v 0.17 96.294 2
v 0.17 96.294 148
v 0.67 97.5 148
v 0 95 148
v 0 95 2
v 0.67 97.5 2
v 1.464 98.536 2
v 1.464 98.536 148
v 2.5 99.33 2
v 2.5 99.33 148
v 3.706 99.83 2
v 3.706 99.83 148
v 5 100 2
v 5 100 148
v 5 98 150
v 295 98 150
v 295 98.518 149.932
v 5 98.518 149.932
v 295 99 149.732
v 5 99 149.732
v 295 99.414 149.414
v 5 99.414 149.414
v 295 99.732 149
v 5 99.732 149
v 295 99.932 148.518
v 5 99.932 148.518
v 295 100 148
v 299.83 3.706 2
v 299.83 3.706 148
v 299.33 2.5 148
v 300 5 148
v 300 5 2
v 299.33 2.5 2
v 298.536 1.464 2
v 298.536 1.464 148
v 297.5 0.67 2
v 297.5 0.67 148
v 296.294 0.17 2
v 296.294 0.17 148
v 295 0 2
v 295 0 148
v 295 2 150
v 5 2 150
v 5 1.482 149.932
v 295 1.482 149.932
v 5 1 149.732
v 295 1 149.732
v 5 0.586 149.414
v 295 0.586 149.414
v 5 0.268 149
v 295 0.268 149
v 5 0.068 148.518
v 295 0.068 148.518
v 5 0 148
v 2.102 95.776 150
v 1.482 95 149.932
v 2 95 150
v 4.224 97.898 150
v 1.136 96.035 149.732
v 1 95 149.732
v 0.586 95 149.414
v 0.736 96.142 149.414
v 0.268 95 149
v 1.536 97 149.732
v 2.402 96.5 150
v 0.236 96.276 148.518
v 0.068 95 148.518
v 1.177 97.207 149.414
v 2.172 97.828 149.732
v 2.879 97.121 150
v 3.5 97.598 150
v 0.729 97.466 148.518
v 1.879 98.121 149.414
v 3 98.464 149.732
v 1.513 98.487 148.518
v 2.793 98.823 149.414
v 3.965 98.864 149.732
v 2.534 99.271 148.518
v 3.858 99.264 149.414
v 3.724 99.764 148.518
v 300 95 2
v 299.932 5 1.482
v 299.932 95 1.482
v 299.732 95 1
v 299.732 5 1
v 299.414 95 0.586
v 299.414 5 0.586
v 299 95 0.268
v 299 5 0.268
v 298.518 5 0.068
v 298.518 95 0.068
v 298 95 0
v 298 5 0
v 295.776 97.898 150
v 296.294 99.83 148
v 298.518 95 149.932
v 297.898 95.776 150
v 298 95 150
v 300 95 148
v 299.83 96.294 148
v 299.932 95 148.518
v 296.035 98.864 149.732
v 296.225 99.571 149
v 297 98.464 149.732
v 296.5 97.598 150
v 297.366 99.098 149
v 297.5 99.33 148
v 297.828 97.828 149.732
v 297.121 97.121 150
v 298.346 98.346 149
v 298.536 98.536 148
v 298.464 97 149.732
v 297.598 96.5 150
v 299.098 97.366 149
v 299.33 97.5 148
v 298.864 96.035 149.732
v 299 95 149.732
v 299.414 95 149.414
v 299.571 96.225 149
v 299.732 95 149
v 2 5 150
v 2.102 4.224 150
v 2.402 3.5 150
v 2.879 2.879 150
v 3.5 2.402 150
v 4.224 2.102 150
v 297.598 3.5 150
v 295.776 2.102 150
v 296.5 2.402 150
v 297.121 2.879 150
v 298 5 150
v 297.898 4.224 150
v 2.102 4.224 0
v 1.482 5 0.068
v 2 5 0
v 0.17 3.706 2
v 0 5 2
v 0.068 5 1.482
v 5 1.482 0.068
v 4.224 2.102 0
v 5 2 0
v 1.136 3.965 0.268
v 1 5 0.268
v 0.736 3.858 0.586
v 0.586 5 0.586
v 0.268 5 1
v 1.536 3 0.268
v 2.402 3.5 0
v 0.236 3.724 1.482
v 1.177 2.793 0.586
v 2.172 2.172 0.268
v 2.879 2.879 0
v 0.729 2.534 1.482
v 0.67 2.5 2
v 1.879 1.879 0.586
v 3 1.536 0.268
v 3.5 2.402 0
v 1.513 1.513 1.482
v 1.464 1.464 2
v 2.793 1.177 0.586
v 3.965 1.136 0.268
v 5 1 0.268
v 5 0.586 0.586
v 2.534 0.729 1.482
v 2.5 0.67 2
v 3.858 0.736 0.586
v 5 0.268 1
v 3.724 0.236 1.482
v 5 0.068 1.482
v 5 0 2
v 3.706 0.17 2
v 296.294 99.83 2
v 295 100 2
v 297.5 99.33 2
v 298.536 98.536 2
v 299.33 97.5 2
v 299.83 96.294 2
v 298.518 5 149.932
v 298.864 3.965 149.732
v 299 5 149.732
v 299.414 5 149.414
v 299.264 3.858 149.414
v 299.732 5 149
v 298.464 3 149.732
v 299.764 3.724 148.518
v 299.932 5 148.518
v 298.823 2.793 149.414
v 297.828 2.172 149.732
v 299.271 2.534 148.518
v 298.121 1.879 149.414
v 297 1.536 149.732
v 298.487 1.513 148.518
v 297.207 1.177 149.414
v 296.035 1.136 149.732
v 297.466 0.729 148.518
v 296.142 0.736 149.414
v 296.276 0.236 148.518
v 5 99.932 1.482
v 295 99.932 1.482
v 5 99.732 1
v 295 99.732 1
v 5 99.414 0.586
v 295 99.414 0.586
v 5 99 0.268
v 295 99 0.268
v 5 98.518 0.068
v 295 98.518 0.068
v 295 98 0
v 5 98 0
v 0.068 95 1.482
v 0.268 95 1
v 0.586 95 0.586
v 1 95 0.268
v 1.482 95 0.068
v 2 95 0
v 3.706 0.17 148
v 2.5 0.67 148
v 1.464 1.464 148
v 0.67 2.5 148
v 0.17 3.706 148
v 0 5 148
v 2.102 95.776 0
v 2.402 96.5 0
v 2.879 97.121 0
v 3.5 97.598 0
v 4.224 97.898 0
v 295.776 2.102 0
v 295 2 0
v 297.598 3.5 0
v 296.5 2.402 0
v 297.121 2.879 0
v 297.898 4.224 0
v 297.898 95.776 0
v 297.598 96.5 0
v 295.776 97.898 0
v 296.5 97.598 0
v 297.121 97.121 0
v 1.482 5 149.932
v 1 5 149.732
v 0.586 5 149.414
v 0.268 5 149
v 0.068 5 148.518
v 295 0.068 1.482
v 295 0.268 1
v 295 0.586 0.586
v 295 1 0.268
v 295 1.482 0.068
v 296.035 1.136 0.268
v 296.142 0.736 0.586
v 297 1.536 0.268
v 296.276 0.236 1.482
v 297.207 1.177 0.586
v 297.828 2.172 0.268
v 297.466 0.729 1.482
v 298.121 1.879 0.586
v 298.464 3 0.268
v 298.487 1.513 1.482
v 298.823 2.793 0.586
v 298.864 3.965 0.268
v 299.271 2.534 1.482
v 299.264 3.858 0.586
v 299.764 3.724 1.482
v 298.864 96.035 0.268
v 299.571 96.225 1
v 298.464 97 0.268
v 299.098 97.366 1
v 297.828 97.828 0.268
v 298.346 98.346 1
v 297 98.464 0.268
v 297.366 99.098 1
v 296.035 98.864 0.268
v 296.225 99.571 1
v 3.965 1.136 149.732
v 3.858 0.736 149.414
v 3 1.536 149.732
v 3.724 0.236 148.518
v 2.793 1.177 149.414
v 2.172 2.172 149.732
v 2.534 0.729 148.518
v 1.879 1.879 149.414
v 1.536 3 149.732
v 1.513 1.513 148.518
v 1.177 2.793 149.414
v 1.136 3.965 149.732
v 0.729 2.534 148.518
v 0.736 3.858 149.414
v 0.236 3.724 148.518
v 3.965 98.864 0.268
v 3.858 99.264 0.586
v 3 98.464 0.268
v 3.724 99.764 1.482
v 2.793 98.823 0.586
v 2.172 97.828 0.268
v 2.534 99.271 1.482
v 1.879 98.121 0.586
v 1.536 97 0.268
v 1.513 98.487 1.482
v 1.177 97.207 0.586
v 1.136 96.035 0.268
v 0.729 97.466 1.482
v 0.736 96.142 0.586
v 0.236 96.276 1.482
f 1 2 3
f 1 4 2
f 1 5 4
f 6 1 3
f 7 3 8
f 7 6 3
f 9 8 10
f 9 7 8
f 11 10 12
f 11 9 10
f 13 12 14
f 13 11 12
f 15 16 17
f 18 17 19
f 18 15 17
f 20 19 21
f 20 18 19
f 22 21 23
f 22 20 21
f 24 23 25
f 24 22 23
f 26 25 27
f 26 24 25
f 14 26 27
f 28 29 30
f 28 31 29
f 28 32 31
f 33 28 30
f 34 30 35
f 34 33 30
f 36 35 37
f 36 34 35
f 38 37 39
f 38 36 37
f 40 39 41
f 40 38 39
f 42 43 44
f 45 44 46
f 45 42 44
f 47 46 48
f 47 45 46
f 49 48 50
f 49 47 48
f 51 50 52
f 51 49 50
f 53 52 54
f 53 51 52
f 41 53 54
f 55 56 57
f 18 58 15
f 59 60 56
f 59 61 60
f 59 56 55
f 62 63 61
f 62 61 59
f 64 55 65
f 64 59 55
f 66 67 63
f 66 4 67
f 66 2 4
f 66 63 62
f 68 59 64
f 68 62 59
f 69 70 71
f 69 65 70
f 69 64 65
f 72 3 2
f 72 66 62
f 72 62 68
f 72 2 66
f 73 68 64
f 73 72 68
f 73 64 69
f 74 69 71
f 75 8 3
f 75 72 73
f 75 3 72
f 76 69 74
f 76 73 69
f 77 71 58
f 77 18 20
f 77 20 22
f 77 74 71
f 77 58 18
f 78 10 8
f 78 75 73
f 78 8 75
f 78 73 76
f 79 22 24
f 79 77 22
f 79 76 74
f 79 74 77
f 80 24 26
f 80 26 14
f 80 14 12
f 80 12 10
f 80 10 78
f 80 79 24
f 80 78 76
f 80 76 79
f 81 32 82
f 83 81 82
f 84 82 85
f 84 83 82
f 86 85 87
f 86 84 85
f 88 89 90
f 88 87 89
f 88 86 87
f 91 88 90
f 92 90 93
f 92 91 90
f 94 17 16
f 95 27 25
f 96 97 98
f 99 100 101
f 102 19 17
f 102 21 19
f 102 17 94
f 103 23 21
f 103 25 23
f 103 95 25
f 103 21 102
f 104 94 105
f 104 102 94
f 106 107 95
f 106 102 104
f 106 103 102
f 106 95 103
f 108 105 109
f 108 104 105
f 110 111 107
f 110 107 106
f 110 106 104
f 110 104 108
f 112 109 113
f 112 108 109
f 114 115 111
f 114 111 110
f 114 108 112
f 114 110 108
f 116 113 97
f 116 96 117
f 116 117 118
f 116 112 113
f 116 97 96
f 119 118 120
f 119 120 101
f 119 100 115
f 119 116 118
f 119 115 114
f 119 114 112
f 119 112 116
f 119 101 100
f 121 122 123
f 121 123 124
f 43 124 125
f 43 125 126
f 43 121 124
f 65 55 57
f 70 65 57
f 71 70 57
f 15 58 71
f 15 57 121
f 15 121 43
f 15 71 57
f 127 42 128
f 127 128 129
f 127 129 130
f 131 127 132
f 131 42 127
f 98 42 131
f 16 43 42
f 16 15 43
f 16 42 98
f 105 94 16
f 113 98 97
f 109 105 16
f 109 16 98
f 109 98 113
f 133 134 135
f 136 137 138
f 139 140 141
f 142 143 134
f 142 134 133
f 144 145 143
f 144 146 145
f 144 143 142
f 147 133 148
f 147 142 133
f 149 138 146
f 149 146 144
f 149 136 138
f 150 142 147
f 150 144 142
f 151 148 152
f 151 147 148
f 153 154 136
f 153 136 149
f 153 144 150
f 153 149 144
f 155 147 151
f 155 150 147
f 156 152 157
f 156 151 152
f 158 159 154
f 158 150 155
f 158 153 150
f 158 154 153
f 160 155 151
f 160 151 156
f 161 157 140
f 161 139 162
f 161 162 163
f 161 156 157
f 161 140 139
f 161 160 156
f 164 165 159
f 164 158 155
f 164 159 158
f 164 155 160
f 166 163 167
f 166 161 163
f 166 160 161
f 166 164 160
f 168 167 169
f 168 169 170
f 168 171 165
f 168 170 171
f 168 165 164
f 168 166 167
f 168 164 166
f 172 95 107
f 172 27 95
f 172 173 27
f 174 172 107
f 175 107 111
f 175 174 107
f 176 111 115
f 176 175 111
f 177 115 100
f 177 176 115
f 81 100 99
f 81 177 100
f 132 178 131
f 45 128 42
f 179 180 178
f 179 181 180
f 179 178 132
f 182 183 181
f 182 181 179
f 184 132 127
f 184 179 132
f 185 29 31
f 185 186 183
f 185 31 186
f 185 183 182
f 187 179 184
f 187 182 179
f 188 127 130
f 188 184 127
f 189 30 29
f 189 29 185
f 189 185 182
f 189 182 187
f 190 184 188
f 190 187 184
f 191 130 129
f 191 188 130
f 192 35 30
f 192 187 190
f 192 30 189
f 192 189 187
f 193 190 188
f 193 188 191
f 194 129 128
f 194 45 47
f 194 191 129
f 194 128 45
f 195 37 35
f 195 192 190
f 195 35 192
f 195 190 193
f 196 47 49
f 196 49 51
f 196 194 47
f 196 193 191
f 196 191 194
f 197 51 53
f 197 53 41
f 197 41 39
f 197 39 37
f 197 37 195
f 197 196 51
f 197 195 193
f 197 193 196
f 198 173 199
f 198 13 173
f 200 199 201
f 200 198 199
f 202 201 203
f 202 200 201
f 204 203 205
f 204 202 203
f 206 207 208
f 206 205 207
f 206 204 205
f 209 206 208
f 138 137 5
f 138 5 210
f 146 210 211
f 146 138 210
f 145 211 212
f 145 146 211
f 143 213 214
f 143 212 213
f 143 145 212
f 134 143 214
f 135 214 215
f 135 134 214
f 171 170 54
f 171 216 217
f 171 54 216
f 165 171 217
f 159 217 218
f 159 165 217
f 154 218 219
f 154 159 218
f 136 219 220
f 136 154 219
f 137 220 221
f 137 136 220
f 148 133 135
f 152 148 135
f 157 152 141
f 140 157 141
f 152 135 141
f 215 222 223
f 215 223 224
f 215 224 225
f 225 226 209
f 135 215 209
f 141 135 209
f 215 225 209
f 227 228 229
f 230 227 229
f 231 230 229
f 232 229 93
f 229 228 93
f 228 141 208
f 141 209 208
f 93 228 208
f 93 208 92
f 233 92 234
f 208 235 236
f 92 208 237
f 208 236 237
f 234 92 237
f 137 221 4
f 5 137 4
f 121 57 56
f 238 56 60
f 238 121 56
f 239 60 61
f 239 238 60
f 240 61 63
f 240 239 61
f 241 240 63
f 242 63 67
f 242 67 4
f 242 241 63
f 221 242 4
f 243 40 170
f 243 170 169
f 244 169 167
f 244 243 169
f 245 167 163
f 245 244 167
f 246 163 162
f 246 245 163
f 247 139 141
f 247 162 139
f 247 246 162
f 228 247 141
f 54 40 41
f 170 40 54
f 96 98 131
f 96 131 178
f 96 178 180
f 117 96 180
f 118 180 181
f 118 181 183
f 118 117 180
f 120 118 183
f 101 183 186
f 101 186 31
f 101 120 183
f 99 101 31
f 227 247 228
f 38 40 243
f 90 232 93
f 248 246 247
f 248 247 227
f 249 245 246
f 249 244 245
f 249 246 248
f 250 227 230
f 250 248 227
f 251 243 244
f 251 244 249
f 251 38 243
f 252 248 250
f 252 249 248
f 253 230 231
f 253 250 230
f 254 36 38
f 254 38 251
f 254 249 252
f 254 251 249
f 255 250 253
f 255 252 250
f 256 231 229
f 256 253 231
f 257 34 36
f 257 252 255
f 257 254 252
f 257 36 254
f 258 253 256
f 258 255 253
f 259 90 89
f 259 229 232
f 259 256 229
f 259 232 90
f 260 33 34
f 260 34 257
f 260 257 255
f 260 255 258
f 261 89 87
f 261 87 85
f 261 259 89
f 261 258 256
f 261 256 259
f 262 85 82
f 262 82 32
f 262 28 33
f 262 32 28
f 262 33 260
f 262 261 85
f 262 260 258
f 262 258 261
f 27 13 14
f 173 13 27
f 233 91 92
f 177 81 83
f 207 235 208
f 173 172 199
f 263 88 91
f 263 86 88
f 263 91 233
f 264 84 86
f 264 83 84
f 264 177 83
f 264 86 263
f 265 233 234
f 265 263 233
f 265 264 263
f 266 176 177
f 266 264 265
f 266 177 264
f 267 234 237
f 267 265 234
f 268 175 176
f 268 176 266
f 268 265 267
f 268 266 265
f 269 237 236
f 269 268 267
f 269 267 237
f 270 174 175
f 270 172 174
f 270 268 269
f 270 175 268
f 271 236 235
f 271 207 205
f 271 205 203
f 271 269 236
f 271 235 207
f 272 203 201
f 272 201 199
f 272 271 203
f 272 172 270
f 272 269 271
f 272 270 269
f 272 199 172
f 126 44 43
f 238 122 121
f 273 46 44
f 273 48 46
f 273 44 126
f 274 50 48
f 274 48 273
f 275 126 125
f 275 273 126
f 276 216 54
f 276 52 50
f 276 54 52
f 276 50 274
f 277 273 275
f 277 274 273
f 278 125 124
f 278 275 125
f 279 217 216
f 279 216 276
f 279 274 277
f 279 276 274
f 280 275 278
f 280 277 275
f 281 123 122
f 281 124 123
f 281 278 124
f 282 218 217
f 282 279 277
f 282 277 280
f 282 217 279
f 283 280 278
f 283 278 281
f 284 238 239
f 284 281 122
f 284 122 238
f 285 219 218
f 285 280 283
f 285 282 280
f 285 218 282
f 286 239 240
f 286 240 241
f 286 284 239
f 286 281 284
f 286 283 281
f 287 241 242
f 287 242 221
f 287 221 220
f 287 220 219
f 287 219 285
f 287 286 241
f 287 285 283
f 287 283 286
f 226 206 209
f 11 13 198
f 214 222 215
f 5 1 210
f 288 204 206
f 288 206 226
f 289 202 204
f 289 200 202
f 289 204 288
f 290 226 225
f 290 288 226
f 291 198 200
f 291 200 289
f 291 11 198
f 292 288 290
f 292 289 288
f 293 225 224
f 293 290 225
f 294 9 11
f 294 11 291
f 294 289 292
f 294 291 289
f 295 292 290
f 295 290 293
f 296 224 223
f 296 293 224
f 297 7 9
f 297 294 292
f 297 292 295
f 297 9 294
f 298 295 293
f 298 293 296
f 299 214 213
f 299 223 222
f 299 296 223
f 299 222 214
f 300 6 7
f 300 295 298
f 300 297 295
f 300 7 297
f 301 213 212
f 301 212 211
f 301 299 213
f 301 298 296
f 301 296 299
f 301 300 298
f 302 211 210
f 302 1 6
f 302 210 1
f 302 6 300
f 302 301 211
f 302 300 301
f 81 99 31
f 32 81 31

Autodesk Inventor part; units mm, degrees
ref_plane "YZ Plane" through (0, 0, 0) normal (1, 0, 0) x (0, 1, 0)
ref_plane "XZ Plane" through (0, 0, 0) normal (0, 1, 0) x (-1, 0, 0)
ref_plane "XY Plane" through (0, 0, 0) normal (0, 0, 1) x (1, 0, 0)
sketch "Sketch1" plane through (0, 0, 0) normal (0, 0, 1) x (1, 0, 0)
  line L0 (0, 5) -> (0, 95)
  line L1 (5, 100) -> (295, 100)
  line L2 (300, 95) -> (300, 5)
  line L3 (295, 0) -> (5, 0)
  arc A0 (5, 100) -> (0, 95) centre (5, 95) ccw
  arc A1 (0, 5) -> (5, 0) centre (5, 5) ccw
  arc A2 (295, 0) -> (300, 5) centre (295, 5) ccw
  arc A3 (300, 95) -> (295, 100) centre (295, 95) ccw
  line L4 (295, 95) -> (5, 95)
  line L5 (5, 95) -> (5, 5)
  line L6 (5, 5) -> (295, 5)
  line L7 (295, 5) -> (295, 95)
  point P0 (0, 0)
  point P1 (0, 100)
  point P2 (300, 100)
  dimension "d0" = 100
  dimension "d1" = 300
  dimension "d2" = 5
  dimension "d6" = 5
extrude "Extrusion1" add sketch "Sketch1" along normal blind 150 contours L0 A0 L1 A3 L2 A2 L3 A1 | L7 L6 L5 L4
fillet "Fillet1" radius 2 16 edges at (298.5355, 98.5355, 150) (150, 100, 150) (1.4645, 98.5355, 150) (0, 50, 150) (1.4645, 1.4645, 150) (150, 0, 150) (298.5355, 1.4645, 150) (300, 50, 150) (298.5355, 98.5355, 0) (150, 100, 0) (1.4645, 98.5355, 0) (0, 50, 0) (1.4645, 1.4645, 0) (150, 0, 0) (298.5355, 1.4645, 0) (300, 50, 0)
